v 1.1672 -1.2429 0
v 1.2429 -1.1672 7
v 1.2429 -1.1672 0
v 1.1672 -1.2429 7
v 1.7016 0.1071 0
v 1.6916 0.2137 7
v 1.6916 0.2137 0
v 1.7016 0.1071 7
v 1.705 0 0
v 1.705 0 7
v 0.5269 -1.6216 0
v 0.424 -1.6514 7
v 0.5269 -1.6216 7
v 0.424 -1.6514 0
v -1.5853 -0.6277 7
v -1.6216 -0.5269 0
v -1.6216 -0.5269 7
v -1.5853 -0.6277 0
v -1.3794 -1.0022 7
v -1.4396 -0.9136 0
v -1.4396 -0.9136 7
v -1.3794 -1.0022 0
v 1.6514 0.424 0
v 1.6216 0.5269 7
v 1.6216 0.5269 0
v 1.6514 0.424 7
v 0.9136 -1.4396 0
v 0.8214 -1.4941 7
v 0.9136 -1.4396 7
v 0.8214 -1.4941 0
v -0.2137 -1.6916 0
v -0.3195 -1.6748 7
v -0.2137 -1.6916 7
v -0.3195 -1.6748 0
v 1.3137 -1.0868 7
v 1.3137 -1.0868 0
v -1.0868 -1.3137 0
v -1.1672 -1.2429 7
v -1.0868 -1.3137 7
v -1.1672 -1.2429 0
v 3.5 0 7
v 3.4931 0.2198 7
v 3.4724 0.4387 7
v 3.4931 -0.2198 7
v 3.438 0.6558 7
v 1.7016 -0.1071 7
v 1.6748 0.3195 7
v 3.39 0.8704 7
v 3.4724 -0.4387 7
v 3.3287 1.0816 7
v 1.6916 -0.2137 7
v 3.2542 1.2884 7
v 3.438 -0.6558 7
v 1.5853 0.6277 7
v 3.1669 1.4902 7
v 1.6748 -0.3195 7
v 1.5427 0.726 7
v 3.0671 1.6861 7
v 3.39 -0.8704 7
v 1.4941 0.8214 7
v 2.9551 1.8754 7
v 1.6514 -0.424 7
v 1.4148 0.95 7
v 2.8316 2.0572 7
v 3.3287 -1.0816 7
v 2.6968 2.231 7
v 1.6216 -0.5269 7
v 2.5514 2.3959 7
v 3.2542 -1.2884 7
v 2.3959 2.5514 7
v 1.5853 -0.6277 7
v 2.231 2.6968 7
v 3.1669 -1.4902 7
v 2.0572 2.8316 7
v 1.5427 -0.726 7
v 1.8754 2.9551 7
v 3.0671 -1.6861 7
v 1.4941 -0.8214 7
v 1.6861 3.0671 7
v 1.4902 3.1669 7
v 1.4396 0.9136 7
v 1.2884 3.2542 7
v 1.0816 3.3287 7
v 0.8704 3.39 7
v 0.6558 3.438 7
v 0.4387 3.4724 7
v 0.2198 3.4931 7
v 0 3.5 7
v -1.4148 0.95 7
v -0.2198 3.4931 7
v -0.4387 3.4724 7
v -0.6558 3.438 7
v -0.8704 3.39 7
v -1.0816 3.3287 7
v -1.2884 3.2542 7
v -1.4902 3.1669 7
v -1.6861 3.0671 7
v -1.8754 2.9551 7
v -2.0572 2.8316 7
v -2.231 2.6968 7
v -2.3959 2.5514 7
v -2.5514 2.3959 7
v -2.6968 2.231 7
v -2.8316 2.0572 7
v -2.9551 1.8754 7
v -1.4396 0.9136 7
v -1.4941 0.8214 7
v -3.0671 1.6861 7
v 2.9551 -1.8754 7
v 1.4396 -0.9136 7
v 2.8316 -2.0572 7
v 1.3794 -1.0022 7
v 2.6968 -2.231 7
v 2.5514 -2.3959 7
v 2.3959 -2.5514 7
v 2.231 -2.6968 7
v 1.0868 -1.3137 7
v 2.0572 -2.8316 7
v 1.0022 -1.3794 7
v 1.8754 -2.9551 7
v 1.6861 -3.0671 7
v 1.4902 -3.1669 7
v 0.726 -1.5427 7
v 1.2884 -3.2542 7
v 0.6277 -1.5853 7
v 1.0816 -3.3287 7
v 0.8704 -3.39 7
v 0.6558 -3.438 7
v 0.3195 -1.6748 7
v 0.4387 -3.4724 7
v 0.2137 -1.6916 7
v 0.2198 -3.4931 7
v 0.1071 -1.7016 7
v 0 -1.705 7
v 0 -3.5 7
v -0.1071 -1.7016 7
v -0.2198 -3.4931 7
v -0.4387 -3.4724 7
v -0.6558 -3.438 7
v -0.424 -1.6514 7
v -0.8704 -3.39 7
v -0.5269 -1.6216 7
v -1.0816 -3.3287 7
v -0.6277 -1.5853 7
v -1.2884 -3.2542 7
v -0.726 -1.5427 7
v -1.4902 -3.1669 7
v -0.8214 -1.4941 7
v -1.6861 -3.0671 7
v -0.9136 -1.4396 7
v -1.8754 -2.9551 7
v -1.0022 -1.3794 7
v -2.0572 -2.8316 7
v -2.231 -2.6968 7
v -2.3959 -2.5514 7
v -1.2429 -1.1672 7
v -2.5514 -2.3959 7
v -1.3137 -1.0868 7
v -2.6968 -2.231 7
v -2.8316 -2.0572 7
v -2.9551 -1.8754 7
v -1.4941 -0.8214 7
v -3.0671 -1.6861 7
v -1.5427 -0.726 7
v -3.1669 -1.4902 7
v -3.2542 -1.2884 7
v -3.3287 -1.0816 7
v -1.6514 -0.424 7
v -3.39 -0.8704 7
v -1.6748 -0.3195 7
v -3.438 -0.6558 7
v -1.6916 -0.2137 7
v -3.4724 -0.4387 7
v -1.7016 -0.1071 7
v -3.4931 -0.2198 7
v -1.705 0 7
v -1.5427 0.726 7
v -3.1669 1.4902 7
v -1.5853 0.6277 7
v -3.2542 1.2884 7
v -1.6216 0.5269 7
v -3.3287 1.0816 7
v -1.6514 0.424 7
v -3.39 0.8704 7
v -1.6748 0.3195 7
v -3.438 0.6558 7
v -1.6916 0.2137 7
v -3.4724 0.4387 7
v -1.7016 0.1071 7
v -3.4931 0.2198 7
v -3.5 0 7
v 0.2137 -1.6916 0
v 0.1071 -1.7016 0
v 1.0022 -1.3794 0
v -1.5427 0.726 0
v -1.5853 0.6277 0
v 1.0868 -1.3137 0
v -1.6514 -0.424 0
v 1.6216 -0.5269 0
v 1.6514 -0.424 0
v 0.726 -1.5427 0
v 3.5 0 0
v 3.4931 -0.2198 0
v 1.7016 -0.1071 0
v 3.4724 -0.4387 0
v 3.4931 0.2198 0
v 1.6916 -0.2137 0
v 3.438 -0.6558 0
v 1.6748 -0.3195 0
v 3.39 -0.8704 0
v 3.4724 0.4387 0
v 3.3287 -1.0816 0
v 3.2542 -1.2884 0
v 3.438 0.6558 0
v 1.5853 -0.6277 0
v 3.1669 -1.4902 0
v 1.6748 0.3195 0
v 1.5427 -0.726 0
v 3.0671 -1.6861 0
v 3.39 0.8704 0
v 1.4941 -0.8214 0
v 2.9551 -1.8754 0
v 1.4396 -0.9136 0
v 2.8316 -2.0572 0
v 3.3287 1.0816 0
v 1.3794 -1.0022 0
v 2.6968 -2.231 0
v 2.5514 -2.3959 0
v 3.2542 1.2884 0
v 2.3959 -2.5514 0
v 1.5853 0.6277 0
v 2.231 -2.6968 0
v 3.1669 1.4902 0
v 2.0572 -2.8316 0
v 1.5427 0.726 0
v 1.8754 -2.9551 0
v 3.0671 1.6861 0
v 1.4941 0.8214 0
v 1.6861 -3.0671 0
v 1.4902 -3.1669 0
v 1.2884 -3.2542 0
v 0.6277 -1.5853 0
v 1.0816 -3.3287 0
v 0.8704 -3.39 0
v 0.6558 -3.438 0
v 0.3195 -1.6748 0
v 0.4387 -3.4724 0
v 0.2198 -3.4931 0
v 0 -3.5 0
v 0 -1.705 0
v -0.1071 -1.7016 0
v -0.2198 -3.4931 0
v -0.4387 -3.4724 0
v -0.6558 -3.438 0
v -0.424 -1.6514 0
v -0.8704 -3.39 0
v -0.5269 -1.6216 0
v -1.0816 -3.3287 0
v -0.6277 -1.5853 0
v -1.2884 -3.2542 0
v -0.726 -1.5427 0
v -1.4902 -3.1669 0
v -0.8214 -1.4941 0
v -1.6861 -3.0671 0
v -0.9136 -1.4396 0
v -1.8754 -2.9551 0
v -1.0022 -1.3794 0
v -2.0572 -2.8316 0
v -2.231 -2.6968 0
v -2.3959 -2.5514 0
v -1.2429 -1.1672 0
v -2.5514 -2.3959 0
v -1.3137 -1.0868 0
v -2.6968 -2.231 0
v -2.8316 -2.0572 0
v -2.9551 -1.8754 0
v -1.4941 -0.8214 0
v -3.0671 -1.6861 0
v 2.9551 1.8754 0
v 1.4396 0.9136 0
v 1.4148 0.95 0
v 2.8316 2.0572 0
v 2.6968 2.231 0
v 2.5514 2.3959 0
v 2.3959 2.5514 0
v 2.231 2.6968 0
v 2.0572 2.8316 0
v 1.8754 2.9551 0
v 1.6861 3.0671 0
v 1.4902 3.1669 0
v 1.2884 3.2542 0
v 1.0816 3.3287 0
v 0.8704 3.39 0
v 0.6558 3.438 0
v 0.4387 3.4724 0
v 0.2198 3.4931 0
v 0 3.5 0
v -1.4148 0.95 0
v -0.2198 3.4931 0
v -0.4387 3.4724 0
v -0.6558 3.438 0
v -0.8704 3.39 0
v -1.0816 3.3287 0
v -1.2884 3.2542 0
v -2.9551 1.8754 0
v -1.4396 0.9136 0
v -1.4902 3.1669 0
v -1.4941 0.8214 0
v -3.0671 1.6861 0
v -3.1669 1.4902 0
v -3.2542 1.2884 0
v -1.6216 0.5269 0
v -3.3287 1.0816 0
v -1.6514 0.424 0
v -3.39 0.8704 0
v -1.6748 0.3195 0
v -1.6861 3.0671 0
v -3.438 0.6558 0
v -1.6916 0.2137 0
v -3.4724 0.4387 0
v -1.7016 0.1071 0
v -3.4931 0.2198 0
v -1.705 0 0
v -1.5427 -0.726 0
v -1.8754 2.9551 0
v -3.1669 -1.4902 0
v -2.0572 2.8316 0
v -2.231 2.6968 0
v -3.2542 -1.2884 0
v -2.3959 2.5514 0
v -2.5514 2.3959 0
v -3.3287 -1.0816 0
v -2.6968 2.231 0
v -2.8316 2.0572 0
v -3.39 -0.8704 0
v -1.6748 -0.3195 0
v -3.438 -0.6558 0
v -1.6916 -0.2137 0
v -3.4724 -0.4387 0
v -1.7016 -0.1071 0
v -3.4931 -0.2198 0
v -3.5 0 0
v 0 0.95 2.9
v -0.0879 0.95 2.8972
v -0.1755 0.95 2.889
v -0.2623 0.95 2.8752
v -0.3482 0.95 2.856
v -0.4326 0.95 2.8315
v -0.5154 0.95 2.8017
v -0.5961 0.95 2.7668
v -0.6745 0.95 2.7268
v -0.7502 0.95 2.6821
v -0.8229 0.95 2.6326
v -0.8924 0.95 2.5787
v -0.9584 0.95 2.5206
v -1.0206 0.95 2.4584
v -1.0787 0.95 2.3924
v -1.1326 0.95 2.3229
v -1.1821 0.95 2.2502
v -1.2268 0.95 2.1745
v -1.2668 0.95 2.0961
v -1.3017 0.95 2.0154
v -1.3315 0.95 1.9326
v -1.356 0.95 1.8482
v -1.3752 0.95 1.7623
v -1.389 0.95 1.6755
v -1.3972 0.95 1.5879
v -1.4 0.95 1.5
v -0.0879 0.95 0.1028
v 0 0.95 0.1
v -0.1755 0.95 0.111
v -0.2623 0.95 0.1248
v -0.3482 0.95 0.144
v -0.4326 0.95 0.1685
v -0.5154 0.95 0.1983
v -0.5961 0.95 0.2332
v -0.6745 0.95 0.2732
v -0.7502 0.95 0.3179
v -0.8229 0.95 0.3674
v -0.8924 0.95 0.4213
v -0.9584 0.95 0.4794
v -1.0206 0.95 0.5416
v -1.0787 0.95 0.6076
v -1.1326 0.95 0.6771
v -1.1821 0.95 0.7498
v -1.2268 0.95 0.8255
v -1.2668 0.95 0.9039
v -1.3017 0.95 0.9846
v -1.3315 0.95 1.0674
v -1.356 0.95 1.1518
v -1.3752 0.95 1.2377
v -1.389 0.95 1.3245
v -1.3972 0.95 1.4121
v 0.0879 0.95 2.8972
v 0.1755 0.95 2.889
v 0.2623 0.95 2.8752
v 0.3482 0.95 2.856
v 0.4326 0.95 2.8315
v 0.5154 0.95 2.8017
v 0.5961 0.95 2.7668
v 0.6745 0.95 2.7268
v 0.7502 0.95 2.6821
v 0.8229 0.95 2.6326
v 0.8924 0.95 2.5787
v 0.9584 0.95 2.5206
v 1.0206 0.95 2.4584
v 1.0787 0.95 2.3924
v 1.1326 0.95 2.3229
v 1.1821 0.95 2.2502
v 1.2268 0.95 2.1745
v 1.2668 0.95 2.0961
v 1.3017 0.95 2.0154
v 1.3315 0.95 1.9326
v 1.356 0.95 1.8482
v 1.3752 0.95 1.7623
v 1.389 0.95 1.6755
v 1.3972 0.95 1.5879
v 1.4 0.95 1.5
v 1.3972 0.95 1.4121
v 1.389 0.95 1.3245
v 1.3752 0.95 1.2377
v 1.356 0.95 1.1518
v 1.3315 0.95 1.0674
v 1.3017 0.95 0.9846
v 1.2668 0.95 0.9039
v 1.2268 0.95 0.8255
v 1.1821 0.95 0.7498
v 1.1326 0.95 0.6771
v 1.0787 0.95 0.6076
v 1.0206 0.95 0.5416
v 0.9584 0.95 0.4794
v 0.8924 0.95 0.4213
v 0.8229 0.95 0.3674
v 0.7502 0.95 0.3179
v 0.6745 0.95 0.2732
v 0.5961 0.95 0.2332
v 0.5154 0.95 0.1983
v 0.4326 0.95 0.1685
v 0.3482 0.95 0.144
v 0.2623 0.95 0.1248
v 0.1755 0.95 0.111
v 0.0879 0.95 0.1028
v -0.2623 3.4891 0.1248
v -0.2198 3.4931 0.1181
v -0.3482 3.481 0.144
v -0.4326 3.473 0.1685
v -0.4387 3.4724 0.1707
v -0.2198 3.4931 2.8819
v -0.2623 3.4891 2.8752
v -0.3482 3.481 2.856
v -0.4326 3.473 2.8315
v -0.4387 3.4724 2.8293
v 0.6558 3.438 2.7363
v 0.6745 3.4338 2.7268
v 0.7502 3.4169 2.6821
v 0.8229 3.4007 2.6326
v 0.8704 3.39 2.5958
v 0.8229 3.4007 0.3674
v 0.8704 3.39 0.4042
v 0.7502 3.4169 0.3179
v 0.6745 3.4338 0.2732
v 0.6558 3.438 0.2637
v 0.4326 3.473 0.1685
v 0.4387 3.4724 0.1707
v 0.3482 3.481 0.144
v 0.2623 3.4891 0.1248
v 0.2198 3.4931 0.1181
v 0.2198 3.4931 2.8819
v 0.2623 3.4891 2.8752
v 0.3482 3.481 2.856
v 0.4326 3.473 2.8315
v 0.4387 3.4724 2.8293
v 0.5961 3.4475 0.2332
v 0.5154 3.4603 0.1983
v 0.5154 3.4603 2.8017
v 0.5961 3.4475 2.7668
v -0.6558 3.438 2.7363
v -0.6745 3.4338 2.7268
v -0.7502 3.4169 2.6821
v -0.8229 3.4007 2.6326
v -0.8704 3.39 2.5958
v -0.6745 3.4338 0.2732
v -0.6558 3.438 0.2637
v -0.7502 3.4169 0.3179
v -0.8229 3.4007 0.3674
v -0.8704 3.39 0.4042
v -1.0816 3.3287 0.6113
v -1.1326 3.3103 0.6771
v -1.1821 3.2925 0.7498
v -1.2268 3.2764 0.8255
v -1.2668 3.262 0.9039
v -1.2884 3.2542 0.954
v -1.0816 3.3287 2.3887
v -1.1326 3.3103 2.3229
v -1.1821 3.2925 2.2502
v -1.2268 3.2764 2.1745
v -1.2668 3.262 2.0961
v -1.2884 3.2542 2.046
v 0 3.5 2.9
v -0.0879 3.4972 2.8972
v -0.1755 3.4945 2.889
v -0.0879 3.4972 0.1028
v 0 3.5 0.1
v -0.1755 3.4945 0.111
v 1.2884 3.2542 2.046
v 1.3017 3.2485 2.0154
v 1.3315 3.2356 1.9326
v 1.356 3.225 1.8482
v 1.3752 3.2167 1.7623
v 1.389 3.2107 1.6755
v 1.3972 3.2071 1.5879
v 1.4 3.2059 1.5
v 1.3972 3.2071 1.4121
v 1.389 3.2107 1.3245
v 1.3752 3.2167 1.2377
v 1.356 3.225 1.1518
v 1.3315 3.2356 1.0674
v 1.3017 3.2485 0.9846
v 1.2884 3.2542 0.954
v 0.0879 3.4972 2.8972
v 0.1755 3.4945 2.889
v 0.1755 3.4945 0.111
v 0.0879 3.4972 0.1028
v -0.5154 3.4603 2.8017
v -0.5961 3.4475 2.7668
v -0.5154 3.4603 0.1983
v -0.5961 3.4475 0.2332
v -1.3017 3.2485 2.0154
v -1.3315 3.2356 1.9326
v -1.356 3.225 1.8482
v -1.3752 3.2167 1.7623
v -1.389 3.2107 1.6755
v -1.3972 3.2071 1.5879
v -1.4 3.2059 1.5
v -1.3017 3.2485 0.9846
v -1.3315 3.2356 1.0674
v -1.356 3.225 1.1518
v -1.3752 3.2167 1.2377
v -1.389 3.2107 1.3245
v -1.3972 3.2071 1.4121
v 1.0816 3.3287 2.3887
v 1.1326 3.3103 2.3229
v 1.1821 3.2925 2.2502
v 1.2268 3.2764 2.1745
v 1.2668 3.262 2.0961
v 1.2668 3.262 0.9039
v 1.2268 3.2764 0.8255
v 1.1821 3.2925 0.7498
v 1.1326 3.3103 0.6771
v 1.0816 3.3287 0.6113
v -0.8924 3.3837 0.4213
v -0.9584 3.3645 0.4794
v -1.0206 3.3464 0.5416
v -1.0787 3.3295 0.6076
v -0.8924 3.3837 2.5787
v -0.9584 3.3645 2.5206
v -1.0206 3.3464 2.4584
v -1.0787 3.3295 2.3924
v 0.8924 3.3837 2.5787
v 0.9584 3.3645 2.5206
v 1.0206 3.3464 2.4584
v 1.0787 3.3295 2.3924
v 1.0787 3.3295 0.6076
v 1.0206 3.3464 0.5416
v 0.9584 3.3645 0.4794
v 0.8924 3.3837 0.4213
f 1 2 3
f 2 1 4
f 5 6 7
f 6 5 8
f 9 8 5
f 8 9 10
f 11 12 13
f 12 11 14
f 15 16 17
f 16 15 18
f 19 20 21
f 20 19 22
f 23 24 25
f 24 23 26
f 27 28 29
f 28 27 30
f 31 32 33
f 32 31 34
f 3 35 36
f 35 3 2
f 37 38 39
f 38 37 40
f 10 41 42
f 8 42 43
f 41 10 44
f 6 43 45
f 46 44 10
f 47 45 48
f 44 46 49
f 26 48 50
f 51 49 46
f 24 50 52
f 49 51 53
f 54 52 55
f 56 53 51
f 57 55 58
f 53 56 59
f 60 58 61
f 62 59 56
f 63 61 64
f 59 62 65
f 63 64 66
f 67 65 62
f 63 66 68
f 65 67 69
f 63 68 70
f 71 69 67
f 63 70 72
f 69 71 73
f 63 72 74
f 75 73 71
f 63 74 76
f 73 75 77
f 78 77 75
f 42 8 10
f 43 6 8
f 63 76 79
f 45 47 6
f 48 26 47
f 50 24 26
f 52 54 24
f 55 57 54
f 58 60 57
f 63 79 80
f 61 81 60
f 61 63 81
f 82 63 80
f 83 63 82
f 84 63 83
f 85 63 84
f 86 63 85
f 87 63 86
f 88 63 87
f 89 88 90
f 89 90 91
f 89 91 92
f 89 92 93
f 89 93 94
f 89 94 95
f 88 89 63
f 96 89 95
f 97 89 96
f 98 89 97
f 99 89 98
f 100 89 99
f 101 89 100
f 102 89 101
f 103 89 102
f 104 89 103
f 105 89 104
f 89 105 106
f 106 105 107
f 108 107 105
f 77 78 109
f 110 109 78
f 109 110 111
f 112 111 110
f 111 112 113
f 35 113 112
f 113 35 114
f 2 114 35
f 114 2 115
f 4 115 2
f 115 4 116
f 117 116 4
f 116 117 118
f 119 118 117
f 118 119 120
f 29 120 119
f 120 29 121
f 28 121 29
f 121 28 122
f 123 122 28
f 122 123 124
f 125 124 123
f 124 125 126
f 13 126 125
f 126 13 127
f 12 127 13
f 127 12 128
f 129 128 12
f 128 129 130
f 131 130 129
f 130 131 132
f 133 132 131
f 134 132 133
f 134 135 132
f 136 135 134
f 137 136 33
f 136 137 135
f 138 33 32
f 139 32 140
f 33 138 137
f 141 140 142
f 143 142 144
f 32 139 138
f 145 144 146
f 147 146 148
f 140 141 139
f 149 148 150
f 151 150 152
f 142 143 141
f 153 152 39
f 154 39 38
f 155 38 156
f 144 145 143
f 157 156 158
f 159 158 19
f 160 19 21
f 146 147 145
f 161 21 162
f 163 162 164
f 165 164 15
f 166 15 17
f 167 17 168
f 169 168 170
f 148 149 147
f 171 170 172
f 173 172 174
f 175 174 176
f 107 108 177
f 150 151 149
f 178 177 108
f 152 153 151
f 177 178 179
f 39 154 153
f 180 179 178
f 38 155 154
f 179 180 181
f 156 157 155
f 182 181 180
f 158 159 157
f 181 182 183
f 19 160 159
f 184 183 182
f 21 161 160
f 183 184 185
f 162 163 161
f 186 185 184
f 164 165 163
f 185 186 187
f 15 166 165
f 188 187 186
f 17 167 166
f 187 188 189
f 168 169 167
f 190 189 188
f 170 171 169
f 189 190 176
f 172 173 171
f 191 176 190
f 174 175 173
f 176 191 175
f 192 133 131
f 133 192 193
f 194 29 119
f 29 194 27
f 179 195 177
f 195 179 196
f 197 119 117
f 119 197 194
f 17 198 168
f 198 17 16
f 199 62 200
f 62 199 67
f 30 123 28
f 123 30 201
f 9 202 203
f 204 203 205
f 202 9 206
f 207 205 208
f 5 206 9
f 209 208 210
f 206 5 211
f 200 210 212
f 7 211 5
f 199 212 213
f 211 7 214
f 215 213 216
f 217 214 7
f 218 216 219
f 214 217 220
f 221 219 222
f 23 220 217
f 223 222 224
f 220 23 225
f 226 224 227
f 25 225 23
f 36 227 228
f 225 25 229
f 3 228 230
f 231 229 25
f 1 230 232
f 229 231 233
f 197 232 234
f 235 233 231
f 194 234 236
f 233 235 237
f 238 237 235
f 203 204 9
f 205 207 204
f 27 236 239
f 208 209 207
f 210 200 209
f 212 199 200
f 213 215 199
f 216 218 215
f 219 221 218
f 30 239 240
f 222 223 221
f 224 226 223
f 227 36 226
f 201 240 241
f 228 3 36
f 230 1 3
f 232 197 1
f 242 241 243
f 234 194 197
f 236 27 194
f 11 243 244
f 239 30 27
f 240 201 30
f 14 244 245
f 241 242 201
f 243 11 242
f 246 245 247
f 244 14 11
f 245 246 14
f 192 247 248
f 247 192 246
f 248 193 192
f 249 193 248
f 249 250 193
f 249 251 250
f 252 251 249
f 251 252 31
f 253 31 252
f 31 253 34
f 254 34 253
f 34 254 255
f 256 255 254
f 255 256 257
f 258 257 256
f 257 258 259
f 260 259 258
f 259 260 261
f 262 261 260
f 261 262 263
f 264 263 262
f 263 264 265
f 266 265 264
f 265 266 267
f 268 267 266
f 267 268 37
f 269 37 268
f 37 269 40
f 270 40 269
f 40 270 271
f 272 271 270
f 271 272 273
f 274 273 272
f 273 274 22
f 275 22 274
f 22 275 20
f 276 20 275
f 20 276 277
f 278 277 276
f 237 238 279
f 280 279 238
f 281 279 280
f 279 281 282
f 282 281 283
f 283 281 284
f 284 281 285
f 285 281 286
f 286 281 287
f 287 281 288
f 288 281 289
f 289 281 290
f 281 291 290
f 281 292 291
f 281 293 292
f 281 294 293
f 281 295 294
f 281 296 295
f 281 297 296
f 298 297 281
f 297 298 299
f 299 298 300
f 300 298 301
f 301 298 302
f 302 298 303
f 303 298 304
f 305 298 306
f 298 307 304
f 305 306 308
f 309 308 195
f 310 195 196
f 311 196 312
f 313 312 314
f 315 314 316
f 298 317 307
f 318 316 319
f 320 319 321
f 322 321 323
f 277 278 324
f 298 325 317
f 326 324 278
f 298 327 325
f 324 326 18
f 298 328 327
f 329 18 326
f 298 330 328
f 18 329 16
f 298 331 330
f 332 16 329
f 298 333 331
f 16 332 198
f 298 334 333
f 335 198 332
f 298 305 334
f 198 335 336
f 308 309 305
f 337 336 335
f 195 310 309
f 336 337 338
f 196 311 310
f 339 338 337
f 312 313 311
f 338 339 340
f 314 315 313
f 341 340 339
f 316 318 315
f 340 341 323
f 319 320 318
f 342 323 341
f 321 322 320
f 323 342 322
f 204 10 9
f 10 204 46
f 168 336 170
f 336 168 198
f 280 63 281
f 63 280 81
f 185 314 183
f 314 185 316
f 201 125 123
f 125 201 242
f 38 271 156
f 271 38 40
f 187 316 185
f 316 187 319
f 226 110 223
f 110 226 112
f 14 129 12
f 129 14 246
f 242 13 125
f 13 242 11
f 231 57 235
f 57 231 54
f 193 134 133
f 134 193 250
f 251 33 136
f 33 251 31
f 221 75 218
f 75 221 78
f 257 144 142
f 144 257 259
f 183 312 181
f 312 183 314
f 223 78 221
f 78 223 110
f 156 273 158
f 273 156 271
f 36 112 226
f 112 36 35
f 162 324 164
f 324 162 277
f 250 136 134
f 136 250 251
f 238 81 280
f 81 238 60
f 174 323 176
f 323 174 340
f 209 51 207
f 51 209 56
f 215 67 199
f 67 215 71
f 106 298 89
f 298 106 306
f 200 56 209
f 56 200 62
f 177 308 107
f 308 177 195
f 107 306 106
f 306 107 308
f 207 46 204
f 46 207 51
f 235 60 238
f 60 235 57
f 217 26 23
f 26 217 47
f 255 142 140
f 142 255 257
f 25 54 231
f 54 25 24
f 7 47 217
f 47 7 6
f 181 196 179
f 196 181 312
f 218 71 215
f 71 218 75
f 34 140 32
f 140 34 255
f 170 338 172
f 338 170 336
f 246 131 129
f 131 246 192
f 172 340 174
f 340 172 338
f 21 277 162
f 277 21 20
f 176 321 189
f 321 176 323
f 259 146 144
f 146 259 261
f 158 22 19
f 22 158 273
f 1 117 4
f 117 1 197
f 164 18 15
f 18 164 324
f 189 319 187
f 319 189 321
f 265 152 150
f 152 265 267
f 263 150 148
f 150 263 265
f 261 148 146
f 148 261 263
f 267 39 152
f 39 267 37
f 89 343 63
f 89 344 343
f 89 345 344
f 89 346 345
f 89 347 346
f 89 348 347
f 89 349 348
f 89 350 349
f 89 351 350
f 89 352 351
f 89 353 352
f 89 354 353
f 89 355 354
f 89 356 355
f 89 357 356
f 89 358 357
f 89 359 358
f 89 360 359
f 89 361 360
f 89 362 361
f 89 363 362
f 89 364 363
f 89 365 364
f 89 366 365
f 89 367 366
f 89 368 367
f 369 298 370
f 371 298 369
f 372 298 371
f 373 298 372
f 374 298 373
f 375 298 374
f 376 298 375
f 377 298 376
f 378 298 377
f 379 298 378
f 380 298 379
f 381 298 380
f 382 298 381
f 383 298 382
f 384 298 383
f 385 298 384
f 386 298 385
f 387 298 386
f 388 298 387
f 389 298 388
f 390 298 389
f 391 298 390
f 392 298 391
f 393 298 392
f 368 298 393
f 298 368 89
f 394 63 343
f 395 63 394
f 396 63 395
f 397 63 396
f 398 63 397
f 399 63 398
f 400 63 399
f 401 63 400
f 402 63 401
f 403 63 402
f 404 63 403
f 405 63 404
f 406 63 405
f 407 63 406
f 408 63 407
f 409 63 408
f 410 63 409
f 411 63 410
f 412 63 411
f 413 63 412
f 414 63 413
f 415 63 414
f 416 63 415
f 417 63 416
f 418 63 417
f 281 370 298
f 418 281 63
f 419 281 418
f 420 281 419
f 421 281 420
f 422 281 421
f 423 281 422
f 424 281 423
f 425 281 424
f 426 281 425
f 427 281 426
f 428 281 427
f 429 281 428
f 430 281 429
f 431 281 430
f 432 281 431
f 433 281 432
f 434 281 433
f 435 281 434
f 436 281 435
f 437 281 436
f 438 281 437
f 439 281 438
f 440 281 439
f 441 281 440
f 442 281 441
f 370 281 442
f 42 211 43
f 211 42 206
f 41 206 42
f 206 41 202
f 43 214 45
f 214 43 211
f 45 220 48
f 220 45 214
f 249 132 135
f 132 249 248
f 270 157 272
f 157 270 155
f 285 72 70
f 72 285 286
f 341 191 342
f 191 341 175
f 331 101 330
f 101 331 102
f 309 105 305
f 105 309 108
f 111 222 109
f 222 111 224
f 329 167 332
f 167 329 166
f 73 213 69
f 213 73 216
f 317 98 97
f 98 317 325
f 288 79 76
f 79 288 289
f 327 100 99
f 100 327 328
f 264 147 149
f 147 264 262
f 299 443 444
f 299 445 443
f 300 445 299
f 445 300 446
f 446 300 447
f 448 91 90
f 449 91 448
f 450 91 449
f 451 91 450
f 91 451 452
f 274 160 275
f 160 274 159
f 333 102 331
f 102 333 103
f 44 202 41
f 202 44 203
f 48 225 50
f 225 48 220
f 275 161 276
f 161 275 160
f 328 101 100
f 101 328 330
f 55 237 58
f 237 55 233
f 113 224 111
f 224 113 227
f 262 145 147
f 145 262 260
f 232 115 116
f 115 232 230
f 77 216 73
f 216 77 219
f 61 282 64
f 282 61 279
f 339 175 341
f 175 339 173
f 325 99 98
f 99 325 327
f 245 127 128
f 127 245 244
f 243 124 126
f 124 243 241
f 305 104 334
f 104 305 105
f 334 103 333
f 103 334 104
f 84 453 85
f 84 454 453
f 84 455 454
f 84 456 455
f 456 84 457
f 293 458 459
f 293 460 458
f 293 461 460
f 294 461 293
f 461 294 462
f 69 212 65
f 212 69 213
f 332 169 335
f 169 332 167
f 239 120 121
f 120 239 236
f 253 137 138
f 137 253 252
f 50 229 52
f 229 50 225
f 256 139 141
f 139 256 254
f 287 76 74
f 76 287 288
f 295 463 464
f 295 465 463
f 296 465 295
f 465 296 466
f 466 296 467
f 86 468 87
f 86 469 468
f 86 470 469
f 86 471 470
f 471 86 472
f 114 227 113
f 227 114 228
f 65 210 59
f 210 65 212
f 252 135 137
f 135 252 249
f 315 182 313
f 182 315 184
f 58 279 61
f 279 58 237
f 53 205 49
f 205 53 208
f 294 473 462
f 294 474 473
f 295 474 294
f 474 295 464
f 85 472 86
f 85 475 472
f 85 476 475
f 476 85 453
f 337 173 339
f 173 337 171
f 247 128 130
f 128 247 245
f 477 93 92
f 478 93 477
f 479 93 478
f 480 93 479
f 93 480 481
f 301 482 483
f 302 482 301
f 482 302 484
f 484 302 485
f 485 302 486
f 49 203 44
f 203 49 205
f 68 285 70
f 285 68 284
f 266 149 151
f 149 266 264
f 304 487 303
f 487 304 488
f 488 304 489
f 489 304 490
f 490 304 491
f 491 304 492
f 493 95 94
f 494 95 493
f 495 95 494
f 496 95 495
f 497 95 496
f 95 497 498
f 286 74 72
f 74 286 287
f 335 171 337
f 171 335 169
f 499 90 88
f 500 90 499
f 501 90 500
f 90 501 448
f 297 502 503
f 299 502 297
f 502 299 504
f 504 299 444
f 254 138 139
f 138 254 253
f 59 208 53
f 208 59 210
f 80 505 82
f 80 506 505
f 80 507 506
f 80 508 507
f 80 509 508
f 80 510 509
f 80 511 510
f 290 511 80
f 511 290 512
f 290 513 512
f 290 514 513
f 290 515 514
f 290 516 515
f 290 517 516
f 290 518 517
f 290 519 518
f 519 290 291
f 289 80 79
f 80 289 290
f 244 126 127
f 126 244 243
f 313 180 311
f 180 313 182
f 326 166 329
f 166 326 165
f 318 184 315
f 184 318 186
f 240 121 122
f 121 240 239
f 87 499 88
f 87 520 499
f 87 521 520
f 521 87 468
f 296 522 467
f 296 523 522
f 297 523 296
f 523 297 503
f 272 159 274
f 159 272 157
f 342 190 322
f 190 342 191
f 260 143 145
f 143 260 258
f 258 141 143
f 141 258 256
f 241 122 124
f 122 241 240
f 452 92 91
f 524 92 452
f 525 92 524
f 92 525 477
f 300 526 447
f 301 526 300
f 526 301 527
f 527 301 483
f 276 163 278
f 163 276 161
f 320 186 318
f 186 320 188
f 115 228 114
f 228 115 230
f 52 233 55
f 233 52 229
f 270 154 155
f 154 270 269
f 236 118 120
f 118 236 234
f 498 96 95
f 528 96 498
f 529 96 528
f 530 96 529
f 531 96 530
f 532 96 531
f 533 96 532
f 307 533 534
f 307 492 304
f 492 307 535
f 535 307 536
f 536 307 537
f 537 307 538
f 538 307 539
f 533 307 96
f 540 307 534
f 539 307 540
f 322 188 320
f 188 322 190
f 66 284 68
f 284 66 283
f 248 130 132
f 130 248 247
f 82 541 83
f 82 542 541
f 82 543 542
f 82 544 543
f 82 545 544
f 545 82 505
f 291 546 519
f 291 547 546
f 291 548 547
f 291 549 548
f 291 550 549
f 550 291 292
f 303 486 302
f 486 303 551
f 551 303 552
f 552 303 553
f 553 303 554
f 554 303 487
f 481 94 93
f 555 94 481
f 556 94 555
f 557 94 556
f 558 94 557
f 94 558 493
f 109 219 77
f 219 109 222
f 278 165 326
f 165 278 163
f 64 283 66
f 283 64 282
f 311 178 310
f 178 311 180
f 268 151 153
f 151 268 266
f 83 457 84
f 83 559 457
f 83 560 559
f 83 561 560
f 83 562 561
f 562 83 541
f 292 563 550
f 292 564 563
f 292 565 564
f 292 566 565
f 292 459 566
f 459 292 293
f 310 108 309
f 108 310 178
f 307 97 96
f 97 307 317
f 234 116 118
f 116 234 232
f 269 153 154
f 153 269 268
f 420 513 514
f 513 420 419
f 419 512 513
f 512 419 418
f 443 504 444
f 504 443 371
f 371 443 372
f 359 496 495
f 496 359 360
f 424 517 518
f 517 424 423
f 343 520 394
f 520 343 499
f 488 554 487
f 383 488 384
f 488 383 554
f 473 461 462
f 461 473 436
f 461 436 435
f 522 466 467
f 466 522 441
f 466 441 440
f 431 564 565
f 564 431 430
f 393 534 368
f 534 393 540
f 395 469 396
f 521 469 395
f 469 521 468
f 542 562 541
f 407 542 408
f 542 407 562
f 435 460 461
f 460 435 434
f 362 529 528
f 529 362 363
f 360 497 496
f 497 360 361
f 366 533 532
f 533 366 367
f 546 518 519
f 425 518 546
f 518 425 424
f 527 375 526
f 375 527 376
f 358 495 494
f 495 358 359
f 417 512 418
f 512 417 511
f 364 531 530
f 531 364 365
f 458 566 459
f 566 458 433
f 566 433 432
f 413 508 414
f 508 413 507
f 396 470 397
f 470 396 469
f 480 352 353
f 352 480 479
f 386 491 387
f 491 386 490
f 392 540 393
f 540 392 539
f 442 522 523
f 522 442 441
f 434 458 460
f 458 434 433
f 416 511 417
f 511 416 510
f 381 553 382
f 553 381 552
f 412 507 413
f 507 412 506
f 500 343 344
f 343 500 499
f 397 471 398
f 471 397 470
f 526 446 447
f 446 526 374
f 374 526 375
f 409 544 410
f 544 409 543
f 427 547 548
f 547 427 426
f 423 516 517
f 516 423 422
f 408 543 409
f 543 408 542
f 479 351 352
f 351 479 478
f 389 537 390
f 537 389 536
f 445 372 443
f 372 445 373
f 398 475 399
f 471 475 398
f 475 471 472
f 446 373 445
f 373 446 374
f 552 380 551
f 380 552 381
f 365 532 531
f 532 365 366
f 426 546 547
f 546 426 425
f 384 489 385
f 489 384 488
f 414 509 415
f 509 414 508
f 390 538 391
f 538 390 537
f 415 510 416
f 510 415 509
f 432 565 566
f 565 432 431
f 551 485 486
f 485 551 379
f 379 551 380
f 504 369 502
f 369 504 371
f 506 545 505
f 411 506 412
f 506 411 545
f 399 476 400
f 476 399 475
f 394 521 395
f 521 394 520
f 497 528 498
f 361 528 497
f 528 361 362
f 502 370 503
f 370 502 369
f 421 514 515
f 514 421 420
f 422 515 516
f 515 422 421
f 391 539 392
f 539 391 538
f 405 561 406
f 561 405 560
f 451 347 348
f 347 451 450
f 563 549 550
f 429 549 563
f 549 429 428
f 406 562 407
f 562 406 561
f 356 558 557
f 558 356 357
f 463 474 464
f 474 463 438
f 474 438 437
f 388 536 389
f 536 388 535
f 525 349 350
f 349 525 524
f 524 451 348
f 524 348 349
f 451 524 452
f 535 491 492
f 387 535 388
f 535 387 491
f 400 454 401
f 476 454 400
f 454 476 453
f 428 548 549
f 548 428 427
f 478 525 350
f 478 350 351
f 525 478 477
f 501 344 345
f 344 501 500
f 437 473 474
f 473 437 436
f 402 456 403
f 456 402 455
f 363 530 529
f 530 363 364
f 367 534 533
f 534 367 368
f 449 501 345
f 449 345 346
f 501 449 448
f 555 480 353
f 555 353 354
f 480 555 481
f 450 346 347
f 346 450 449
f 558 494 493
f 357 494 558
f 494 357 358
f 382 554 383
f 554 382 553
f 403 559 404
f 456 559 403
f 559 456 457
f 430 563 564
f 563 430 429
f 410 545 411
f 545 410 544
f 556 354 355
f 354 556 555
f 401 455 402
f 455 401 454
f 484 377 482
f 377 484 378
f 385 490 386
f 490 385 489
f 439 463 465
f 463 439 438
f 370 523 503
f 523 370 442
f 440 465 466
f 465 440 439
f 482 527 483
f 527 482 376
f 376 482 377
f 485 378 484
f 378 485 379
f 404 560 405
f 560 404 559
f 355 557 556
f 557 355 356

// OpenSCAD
$fn=100;

shaft_d = 3.1;
shaft_d_flat = 2.5;
shaft_l = 7;
shaft_outer_d = 7;

rim_d = 28;

teeth_depth = 6;
teeth_width = 8;
teeth_twist=30;
teeth_steps=30;
tire_thickness=3;
teeth_stand_out_angle = 0;
join_stand_out = 3;

// Close teeth

teeth_depth = 0.8;
teeth_width = 3;
teeth_twist=10;
teeth_steps=12;
tire_thickness=1.4;
tire_width = 16;
teeth_stand_out_angle = 8;

fasten_hole_shaft_d = 2.8;
fasten_hole_tire_d = 3.5;
fasten_hole_height = 1.5;

// Small settings
//WIDTH = 12;
//R3 = 16;
//teeth_depth = 2;
//teeth_width = 8;
//teeth_twist=5;
//teeth_steps=20;
//tire_thickness=1;

module rotate_about_pt(r, pt) {
    translate(pt)
    rotate(r)
    translate(-pt)
    children();   
}

module shaft() {
    difference() {
        cylinder(shaft_l, d=shaft_outer_d);
        difference() {
            cylinder(shaft_l, d1=shaft_d*1.1, d2=shaft_d*1.1);
            translate([-shaft_d/2,shaft_d_flat-shaft_d/2,0])
            cube([shaft_d, shaft_d, shaft_l]);
        }
        // screw hole for locking the motor
        translate([0,0,fasten_hole_height])
        rotate([-90,0,0])
        cylinder(shaft_outer_d/2, d=fasten_hole_shaft_d);
    }
}


module rim() {
    start = shaft_outer_d/2 - 0.5;
    r = rim_d/2 - start;
    spike_w = 1;
    for(i=[180:120:180*3]) {
        rotate([0,0,i])
        difference() {
            translate([spike_w/2,start,0])
            rotate([0,-90,0])
            cube([tire_width, r, spike_w]);
            
            translate([spike_w/2,start,tire_width])
            scale([1.1,1,1])
            translate([0.01,0,0])
            resize([spike_w,r*2,tire_width*2 - shaft_l], auto=true)
            rotate([0,-90,0])
            cylinder(spike_w, r=r);
        }
    }
}

module tire() {
    module toot() { 
        translate([rim_d/2,0,0]) 
        rotate([0,0,teeth_stand_out_angle]) 
        translate([0,-teeth_width,0]) 
        square([teeth_depth, teeth_width]);
    }
    difference() {
        union() {
            difference() {
                cylinder(tire_width, d=rim_d+tire_thickness);
                translate([0,0,-0.5])
                cylinder(tire_width+1, d=rim_d);
            }
//            rotate_extrude()
//            translate([rim_d/2,0,0]) 
//            square([tire_thickness, tire_width]);

            

            for(i=[0:teeth_steps:360]) {
                rotate([0,0,i])
                linear_extrude(tire_width/2, twist=teeth_twist)
                toot();
                
                rotate([0,0,i])
                translate([0,0,tire_width/2])
                linear_extrude(tire_width/2, twist=-teeth_twist)
                toot();
            }
        }
        
        // hole for accessing the fastening screw
        translate([0,rim_d/2,fasten_hole_height])
        rotate([-90,0,0])
        cylinder(shaft_outer_d/2, d=fasten_hole_tire_d, center=true);
    }
}


!shaft();
rim();
tire();
